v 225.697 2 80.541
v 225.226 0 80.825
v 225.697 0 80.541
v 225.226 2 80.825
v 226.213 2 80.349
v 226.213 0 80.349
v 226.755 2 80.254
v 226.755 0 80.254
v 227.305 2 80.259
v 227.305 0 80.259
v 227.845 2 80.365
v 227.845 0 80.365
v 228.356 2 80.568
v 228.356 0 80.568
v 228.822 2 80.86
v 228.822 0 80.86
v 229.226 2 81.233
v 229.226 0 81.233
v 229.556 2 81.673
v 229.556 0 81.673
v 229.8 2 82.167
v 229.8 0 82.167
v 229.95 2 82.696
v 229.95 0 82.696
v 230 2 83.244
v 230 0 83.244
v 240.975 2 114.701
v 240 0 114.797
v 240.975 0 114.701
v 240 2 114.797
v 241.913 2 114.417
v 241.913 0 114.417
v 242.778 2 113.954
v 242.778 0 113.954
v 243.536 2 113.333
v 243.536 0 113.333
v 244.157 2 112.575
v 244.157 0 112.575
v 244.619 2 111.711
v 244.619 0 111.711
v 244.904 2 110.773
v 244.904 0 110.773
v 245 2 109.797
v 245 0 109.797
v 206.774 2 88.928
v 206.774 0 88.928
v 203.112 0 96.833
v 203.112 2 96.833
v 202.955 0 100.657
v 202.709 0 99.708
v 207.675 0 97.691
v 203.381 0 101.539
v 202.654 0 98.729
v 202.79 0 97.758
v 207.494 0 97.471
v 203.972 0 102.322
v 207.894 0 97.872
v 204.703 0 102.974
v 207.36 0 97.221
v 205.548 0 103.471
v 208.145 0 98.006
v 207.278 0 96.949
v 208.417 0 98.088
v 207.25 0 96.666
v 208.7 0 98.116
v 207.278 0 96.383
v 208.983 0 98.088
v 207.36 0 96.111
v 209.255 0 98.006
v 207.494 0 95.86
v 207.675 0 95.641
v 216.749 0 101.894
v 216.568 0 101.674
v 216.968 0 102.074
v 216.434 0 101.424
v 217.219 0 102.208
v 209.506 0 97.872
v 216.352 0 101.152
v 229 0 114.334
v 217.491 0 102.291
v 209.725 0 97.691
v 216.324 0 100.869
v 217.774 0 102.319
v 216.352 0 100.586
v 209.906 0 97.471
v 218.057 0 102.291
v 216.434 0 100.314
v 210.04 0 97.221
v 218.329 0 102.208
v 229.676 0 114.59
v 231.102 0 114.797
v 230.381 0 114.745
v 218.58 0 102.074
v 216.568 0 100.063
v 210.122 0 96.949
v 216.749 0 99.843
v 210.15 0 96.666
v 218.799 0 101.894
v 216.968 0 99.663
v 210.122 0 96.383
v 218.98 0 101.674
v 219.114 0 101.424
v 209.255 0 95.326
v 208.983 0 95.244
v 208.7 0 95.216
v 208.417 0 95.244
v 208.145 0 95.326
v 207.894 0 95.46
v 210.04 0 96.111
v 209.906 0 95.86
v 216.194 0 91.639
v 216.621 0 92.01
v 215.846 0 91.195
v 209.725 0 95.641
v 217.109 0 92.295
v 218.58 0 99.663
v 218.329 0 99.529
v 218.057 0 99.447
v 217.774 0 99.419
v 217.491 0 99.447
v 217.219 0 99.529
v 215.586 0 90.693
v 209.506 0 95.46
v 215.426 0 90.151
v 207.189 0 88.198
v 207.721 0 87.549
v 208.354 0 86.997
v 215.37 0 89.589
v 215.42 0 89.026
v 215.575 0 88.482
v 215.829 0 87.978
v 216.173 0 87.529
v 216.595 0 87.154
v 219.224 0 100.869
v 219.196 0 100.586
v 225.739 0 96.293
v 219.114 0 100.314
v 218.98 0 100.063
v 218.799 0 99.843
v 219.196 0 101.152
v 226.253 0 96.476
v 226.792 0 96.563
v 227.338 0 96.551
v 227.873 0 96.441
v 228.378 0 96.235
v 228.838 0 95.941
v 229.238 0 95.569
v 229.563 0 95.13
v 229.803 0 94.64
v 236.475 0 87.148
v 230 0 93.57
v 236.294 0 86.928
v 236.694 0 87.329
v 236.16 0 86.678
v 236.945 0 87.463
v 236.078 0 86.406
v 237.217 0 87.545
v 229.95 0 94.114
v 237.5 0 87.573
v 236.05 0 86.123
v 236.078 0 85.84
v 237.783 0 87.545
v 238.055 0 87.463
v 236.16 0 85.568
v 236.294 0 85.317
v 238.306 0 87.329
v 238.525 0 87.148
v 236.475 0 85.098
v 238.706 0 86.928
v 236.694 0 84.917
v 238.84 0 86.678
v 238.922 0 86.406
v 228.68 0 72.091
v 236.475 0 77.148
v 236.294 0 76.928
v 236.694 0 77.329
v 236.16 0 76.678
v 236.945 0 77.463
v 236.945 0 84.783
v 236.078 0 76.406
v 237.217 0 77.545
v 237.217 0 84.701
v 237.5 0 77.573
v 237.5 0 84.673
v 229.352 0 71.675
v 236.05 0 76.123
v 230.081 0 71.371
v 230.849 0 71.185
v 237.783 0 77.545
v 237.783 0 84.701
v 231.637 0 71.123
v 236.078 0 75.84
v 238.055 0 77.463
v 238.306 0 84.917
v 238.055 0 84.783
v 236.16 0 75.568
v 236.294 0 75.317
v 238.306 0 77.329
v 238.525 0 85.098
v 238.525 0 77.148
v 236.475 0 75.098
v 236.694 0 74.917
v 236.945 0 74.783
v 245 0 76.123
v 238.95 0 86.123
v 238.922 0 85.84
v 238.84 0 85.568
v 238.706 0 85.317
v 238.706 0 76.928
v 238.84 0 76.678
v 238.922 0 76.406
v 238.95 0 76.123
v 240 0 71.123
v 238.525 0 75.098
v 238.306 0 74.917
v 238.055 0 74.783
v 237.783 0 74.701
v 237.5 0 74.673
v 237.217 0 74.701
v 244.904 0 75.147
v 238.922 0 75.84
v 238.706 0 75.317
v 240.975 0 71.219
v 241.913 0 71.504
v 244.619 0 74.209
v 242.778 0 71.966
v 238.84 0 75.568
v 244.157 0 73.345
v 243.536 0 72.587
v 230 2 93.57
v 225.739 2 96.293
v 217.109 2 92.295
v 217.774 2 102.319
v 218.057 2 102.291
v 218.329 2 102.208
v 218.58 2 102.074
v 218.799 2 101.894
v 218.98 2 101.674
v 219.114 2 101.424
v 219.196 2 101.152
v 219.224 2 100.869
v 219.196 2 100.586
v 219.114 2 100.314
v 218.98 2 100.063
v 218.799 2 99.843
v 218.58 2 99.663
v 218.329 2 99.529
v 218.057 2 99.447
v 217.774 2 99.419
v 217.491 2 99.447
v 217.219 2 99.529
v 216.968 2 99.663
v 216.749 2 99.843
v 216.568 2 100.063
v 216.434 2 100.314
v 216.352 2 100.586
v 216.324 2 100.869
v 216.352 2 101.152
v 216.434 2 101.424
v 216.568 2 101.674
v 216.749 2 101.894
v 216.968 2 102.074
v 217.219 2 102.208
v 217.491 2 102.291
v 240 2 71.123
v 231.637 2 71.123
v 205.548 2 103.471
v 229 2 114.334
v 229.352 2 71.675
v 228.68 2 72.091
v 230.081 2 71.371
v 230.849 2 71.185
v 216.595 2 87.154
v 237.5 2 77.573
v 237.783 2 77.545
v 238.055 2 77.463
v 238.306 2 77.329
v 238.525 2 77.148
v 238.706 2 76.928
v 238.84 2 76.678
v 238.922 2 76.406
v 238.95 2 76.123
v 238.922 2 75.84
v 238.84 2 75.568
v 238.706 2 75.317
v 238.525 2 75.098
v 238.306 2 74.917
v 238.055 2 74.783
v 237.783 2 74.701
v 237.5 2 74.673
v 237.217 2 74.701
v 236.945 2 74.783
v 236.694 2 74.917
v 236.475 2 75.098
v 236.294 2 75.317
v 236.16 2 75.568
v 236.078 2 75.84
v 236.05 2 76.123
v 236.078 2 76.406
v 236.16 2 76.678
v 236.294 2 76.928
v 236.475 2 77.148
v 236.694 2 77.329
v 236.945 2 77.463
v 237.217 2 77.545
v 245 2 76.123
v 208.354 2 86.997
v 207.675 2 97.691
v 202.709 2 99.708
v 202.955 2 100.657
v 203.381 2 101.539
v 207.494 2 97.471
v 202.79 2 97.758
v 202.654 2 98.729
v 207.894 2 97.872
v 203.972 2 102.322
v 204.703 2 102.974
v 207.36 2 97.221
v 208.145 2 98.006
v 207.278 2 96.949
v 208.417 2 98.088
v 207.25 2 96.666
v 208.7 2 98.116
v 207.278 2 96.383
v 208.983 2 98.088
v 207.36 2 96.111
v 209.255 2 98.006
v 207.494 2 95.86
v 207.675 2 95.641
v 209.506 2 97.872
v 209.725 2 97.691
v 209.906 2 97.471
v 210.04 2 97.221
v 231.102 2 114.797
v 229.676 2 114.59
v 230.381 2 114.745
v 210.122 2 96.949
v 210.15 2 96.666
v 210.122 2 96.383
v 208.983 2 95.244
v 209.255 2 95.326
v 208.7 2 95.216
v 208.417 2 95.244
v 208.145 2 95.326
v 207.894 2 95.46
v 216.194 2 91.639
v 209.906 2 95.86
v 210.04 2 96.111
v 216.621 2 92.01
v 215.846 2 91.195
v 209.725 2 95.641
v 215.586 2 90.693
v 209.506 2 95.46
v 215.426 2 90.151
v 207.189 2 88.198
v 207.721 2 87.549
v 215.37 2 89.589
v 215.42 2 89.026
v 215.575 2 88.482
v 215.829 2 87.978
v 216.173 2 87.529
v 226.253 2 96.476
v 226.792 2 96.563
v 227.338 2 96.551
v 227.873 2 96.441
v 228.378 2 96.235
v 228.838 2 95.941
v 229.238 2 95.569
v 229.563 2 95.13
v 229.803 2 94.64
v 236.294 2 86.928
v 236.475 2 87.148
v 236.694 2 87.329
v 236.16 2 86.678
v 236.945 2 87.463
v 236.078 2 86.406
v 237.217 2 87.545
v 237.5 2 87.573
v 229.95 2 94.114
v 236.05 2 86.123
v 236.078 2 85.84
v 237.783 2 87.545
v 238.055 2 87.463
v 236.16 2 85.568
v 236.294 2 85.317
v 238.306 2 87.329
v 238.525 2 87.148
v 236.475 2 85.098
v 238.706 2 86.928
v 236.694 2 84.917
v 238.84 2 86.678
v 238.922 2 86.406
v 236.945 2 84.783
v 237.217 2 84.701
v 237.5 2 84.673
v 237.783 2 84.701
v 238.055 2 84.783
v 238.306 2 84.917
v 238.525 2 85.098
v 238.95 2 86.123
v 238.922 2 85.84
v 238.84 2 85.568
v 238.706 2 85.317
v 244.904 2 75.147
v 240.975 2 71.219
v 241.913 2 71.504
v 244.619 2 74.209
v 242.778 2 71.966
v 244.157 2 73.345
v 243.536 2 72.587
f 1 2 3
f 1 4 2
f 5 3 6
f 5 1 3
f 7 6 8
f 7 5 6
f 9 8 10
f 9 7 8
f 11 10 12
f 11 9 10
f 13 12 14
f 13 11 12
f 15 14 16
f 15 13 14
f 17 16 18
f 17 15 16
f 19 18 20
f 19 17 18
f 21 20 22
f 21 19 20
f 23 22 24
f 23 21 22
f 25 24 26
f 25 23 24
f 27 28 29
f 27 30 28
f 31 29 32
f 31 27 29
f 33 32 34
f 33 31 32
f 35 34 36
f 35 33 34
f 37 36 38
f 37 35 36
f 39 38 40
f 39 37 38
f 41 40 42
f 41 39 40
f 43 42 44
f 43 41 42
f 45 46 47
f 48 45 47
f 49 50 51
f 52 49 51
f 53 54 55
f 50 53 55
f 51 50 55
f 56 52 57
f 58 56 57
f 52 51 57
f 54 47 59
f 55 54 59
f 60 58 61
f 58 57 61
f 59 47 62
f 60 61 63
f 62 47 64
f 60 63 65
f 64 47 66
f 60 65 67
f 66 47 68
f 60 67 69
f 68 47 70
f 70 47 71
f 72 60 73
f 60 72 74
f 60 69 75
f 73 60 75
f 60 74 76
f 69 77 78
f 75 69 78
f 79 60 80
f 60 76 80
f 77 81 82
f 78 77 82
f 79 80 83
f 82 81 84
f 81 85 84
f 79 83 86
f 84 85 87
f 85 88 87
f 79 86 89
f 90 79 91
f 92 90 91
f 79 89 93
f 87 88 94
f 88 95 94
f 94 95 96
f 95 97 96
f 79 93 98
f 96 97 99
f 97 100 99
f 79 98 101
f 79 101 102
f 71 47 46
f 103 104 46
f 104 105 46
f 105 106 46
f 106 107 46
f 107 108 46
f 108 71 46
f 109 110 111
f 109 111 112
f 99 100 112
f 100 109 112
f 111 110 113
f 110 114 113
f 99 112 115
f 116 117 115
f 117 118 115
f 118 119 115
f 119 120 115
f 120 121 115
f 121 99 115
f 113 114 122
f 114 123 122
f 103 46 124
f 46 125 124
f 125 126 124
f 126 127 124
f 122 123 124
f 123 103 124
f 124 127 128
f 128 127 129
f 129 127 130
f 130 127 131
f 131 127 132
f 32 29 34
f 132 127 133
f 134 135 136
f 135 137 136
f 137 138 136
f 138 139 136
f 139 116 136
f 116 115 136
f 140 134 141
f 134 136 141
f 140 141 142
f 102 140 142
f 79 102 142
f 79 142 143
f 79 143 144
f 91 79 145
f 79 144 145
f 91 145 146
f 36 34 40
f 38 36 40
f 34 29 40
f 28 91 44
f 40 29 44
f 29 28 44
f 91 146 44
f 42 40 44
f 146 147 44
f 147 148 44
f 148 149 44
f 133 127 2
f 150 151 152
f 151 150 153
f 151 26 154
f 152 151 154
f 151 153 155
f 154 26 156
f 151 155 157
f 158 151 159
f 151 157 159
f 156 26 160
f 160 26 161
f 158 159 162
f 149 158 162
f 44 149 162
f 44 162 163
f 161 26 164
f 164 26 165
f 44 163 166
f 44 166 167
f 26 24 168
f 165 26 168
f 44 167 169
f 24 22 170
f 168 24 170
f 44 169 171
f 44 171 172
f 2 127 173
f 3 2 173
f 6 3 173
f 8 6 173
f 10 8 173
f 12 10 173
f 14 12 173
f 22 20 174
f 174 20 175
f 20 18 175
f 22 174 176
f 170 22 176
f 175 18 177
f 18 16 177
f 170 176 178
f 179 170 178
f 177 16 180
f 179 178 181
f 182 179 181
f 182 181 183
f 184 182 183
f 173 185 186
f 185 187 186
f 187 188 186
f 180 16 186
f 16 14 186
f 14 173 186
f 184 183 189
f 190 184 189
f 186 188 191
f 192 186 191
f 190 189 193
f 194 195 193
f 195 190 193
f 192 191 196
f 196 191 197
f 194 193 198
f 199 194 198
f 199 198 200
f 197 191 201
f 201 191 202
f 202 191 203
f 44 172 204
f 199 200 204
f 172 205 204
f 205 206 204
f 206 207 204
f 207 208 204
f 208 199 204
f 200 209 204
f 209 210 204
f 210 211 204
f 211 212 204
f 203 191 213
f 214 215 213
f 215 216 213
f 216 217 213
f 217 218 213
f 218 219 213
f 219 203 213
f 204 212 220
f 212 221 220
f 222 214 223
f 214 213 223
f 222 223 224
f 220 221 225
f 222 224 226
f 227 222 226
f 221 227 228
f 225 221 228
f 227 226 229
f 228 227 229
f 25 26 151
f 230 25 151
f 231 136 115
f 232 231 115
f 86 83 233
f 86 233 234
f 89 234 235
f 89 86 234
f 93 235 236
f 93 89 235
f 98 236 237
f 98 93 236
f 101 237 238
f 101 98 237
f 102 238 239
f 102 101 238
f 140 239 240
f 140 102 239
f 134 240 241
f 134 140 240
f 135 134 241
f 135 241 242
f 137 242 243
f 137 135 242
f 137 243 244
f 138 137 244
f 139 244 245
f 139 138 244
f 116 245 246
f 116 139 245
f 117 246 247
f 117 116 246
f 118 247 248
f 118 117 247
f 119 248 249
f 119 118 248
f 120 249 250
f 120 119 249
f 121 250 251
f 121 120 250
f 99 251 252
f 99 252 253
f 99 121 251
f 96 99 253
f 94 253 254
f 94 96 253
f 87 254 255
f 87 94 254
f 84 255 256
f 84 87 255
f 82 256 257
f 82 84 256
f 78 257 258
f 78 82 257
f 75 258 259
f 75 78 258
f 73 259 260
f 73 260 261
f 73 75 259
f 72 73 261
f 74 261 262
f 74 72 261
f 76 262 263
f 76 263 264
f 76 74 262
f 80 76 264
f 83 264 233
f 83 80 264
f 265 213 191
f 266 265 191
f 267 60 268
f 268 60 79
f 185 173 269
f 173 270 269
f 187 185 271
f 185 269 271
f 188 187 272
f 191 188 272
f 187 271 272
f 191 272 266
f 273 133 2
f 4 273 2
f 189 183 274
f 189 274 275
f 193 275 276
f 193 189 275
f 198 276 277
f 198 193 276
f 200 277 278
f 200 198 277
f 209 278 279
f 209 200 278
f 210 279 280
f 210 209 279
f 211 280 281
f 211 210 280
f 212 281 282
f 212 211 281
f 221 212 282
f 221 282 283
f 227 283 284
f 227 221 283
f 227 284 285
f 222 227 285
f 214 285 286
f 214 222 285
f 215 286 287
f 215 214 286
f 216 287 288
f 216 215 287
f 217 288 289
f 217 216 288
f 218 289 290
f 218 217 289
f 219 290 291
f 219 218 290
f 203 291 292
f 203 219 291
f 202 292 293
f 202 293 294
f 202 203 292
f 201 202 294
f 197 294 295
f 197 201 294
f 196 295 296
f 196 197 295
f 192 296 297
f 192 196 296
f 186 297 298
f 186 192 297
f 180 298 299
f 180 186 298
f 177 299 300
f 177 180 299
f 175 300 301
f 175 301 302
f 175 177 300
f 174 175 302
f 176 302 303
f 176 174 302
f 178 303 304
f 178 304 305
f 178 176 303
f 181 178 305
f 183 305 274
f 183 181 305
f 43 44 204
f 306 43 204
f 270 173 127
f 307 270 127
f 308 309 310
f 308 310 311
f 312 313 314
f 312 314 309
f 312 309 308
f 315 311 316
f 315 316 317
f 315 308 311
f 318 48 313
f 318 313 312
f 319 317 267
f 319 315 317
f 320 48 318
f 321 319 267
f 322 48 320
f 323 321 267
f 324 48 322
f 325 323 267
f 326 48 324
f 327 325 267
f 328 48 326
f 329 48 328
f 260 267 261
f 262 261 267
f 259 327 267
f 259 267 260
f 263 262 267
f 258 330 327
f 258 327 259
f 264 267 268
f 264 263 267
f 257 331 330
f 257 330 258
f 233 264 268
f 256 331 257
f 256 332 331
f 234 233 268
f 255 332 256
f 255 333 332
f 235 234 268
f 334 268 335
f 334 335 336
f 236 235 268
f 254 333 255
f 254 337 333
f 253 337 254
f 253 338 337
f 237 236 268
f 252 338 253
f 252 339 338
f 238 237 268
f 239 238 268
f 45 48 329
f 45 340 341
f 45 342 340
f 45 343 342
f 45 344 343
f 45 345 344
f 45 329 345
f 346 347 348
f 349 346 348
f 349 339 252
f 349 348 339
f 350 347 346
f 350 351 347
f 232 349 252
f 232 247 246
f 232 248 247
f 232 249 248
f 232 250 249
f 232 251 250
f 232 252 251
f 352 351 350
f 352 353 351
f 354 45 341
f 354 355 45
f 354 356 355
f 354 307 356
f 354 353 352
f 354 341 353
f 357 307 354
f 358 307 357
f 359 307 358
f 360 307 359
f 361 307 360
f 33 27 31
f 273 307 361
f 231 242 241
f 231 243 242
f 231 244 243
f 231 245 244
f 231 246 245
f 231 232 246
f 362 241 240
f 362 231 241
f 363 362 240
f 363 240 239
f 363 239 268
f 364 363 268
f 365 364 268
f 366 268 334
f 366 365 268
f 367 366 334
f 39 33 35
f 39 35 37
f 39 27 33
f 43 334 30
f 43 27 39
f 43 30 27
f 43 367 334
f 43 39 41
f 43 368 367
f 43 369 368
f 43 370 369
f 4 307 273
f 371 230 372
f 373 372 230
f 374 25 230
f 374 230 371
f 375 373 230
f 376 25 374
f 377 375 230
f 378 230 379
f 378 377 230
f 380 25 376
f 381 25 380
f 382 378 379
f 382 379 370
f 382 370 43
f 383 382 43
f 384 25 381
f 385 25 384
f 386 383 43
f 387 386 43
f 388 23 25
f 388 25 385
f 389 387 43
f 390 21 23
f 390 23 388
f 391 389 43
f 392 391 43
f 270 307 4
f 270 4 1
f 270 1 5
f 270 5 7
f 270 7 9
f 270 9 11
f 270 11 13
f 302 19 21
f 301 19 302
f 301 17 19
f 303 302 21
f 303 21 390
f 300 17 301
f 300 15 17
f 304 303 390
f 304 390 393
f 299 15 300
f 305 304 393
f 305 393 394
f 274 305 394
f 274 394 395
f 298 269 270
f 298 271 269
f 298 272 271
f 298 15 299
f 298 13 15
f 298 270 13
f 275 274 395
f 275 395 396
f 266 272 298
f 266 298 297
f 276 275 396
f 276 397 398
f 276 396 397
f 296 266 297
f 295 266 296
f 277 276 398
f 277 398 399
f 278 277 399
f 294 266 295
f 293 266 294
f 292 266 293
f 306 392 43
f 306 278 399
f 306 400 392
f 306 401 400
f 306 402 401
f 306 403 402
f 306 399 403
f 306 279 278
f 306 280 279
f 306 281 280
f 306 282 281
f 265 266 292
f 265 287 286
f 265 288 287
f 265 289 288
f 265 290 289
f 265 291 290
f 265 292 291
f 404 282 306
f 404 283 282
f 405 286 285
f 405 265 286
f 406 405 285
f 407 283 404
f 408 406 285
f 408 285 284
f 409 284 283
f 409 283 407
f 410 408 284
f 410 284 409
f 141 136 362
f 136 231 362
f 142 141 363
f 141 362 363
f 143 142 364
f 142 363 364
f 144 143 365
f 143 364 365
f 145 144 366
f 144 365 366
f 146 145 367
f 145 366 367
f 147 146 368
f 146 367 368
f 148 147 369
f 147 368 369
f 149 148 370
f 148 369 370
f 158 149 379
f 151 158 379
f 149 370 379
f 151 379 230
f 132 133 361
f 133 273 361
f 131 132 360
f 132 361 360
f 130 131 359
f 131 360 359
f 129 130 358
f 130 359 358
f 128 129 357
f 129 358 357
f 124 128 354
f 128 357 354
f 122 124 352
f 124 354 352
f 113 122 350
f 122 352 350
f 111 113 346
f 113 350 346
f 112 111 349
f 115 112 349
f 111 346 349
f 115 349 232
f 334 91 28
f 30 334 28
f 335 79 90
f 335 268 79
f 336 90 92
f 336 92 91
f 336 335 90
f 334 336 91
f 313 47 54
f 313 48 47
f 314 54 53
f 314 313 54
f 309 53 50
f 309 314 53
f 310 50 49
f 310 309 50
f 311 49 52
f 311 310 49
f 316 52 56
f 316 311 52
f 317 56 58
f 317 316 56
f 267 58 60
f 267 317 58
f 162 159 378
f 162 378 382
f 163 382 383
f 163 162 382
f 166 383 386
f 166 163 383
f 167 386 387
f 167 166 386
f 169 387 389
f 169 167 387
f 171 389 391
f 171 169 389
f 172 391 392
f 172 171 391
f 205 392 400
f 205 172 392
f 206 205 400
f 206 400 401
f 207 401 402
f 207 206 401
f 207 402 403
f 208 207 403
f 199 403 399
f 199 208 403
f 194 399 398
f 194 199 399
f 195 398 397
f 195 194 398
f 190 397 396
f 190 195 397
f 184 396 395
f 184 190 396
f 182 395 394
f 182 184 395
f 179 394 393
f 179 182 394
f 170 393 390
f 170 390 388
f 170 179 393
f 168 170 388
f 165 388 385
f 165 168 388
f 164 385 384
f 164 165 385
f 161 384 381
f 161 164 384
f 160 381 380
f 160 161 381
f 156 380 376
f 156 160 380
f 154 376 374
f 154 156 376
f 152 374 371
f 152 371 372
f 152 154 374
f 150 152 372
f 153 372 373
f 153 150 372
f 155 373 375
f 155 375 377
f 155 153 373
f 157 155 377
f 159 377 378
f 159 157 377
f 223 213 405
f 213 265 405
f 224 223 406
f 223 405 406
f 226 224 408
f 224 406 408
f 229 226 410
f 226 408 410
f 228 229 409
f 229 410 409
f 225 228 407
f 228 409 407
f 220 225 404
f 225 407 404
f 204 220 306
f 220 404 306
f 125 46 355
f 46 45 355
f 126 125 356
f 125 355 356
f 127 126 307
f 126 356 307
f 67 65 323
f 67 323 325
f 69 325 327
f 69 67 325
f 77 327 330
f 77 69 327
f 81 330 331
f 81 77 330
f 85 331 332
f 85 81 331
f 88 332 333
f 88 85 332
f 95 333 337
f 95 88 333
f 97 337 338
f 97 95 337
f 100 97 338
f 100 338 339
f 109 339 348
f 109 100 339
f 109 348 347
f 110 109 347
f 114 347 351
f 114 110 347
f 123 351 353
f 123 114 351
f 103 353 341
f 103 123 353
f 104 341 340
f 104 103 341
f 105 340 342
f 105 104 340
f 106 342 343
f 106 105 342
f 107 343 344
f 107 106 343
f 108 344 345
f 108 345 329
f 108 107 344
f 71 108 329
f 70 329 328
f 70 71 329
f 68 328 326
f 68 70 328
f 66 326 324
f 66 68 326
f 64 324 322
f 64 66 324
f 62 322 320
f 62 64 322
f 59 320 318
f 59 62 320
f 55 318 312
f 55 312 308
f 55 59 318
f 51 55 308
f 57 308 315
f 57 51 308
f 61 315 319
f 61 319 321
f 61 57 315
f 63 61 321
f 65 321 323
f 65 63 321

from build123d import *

# Parameters (mm, degrees)
SKETCH_1_R      = 1.45
EXTRUDE_1_DEPTH = 2
FILLET_1_R      = 5
FILLET_2_R      = 3


with BuildPart() as part:
    # 草图1 → 凸台-拉伸1 (new body)
    with BuildSketch(Plane(origin=(0, 0, 0), x_dir=(1, 0, 0), z_dir=(0, 1, 0))):
        Polygon((207.315214967, -87.759054481), (201.010915634, -101.369925501), (230, -114.797123874), (245, -114.797123874), (245, -111.623574981), (245, -71.122908945), (230, -71.122908945), align=None)
        with Locations(Location((217.77393632, -100.868789323, 0), (0, 0, 270))):
            Circle(SKETCH_1_R, mode=Mode.SUBTRACT)
        with Locations(Location((208.700022307, -96.665923102, 0), (0, 0, 270))):
            Circle(SKETCH_1_R, mode=Mode.SUBTRACT)
        with Locations(Location((237.5, -86.122908945, 0), (0, 0, 270))):
            Circle(SKETCH_1_R, mode=Mode.SUBTRACT)
        with Locations(Location((237.5, -76.122908945, 0), (0, 0, 270))):
            Circle(SKETCH_1_R, mode=Mode.SUBTRACT)
        Polygon((230, -77.323350324), (230, -98.266220035), (212.497179662, -90.159243016), align=None, mode=Mode.SUBTRACT)
    extrude(amount=EXTRUDE_1_DEPTH)

    # 圆角1
    fillet_1_edges = [part.edges().sort_by_distance(p)[0] for p in [
        (230, 1, 71.122908945),
        (245, 1, 71.122908945),
        (245, 1, 114.797123874),
        (230, 1, 114.797123874),
        (201.010915634, 1, 101.369925501),
        (207.315214967, 1, 87.759054481),
    ]]
    fillet(fillet_1_edges, radius=FILLET_1_R)

    # 圆角2
    fillet_2_edges = [part.edges().sort_by_distance(p)[0] for p in [
        (230, 1, 77.323350324),
        (212.497179662, 1, 90.159243016),
        (230, 1, 98.266220035),
    ]]
    fillet(fillet_2_edges, radius=FILLET_2_R)


solid = part.part
